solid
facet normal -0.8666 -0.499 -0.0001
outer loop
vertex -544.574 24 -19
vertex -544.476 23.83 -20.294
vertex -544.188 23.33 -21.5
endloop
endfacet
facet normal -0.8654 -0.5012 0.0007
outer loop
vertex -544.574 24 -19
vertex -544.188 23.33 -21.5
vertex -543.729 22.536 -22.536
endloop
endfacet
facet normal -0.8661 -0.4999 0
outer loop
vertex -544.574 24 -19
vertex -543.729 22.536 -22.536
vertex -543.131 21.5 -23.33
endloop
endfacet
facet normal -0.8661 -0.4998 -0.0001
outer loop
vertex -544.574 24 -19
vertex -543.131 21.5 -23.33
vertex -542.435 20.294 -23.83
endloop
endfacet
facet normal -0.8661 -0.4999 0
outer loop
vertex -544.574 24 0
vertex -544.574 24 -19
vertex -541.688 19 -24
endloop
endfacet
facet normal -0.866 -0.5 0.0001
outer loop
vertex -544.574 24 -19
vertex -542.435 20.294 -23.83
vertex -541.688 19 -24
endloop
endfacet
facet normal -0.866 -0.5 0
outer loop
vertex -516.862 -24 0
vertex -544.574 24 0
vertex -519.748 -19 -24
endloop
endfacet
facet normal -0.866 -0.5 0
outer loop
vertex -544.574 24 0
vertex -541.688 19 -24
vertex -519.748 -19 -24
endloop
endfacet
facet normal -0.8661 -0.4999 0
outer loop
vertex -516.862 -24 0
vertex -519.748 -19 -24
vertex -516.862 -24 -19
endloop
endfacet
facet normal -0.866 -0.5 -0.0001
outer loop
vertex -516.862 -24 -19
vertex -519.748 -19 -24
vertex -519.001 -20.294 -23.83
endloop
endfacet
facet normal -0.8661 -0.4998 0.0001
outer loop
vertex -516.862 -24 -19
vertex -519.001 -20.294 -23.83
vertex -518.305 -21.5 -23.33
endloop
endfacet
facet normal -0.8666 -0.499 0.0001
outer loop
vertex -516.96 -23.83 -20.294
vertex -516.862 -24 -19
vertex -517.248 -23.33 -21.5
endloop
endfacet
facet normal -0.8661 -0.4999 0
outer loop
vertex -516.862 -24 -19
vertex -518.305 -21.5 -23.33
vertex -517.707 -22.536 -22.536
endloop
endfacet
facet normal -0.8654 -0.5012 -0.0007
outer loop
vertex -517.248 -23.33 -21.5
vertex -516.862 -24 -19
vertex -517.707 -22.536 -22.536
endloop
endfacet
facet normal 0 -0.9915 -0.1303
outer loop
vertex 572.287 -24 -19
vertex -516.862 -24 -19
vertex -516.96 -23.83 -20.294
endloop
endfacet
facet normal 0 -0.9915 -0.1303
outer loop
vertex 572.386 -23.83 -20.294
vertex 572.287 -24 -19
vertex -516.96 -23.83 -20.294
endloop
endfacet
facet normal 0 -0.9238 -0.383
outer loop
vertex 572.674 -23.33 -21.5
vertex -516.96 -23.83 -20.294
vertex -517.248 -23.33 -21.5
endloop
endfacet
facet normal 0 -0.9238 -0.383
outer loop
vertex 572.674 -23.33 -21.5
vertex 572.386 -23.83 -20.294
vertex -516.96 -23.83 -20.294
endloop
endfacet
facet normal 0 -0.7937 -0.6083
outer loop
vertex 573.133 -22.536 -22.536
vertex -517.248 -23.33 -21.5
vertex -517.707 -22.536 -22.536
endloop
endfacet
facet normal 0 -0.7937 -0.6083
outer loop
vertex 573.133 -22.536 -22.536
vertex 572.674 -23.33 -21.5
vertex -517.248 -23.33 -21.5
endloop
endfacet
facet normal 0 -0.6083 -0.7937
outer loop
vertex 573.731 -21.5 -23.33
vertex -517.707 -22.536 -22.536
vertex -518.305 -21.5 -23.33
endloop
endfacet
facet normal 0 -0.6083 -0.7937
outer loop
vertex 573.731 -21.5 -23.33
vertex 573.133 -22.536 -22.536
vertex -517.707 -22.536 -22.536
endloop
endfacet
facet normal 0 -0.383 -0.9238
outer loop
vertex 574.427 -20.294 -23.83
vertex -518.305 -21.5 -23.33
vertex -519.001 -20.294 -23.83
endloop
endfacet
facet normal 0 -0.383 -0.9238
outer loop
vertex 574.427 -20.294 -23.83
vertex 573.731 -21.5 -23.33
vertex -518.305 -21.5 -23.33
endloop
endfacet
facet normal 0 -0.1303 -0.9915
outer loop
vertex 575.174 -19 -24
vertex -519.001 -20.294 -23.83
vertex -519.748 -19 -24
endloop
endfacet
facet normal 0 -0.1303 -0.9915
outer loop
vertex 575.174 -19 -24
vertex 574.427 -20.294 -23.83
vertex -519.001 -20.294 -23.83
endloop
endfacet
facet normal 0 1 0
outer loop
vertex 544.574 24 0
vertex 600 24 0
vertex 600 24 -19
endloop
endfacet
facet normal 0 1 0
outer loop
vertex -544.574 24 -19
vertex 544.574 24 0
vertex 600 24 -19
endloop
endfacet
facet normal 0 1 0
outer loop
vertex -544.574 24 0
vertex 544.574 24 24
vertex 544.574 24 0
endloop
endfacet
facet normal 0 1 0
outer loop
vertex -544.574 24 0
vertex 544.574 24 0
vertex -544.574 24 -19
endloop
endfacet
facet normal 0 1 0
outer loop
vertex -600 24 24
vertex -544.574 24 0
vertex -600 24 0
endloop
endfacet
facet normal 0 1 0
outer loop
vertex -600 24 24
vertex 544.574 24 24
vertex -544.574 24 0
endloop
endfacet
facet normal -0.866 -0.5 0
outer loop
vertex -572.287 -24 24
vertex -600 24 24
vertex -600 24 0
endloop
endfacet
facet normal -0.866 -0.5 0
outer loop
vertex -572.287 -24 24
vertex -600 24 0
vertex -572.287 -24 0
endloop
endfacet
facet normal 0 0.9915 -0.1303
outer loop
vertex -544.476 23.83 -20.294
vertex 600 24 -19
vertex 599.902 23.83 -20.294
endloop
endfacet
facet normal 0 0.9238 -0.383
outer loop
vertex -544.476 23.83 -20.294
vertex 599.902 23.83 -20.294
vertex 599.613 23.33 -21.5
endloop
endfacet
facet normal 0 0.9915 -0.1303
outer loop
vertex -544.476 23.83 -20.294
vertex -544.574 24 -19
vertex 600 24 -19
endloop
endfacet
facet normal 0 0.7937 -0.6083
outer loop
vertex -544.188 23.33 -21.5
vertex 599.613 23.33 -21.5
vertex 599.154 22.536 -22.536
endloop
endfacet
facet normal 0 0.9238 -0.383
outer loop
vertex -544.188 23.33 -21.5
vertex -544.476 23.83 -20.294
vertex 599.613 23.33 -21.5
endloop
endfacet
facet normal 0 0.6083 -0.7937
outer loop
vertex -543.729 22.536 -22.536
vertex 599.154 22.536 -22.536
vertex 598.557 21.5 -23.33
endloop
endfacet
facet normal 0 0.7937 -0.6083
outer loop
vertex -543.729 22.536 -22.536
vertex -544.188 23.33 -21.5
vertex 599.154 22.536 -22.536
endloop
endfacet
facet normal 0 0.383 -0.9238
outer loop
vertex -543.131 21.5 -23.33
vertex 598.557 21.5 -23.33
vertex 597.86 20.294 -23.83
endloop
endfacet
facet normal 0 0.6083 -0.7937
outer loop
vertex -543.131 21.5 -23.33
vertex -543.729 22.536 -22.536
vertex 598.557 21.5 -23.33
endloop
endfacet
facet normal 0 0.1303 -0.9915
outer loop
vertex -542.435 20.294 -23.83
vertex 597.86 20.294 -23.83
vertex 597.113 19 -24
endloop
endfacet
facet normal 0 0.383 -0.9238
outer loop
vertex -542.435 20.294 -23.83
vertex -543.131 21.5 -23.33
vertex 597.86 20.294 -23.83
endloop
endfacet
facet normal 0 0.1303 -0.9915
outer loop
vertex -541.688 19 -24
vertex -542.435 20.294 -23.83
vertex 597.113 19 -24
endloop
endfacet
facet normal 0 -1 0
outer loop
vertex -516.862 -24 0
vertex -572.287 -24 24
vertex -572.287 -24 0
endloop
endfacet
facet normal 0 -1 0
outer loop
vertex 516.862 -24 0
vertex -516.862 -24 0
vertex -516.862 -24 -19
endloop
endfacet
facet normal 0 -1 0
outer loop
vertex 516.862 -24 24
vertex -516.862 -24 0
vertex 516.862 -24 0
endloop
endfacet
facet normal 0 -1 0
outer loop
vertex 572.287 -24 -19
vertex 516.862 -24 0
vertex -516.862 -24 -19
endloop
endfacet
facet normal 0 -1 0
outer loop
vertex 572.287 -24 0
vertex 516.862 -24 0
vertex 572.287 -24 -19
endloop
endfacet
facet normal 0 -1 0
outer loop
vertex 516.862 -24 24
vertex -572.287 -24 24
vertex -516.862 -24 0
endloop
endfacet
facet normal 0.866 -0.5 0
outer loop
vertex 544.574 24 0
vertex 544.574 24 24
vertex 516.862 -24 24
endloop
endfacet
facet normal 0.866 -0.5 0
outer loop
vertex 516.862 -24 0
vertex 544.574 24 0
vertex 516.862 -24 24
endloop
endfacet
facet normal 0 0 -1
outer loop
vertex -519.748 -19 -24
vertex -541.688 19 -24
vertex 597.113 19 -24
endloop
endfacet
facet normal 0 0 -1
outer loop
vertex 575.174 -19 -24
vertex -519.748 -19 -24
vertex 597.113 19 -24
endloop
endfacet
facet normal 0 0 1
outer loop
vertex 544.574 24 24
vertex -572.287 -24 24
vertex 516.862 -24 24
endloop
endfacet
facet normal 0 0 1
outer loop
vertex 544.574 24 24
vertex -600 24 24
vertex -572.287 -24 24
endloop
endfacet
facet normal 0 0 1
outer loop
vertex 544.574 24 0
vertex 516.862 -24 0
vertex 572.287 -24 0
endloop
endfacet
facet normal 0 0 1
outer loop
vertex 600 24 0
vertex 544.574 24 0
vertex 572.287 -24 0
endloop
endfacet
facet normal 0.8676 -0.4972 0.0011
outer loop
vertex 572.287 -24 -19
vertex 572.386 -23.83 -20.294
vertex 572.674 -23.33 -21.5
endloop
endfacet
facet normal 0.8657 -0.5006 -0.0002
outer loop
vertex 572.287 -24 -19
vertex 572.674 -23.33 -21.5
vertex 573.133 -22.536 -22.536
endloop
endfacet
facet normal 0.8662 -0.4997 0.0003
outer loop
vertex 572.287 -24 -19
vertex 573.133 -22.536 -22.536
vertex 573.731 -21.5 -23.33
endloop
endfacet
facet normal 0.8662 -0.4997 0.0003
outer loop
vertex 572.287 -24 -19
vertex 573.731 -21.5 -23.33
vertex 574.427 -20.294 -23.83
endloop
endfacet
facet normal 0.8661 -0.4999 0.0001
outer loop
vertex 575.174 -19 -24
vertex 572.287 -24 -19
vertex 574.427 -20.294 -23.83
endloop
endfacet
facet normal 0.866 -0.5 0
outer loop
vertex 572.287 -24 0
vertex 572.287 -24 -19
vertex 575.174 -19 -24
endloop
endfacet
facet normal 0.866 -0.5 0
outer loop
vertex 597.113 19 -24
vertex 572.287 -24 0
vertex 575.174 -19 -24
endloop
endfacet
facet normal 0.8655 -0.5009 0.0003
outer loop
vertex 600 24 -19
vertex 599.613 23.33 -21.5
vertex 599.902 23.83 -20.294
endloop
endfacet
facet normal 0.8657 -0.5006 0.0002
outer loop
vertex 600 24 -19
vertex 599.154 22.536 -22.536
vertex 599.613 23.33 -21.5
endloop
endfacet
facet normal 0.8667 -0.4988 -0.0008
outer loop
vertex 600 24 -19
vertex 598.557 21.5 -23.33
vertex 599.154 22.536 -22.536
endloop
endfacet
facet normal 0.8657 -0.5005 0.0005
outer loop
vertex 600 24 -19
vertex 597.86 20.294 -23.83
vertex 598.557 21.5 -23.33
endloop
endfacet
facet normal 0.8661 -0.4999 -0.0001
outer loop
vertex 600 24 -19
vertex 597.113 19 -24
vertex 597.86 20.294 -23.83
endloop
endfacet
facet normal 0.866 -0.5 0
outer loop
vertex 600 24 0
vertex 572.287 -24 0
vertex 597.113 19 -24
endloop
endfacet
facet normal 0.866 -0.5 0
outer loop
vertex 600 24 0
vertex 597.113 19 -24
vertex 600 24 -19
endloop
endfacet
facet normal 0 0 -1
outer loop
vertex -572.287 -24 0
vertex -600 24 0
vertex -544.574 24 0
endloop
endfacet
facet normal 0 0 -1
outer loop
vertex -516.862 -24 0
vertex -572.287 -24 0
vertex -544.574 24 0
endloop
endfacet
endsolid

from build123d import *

# Parameters (mm, degrees)
F1_DEPTH = 24
F3_DEPTH = 24
F5_DEPTH = 24
F6_R     = 5


with BuildPart() as f1:
    # F0 (on Top) → F1 (new body, symmetric)
    with BuildSketch(Plane.XY):
        Polygon((572.287187, -24), (600, 24), (-600, 24), (-572.287187, -24), align=None)
    extrude(amount=F1_DEPTH, both=True)

    # F2 (on face) → F3 (cut)
    with BuildSketch(Plane.XY.offset(24)):
        Polygon((544.574374, 24), (516.861561, -24), (572.287187, -24), (600, 24), align=None)
    extrude(amount=-F3_DEPTH, mode=Mode.SUBTRACT)

    # F4 (on face) → F5 (cut)
    with BuildSketch(Plane(origin=(0, 0, -24), x_dir=(1, 0, 0), z_dir=(0, 0, -1))):
        Polygon((-544.574374, -24), (-516.861561, 24), (-572.287187, 24), (-600, -24), align=None)
    extrude(amount=-F5_DEPTH, mode=Mode.SUBTRACT)

    # F6
    f6_edges = [f1.edges().sort_by_distance(p)[0] for p in [
        (27.712813, 24, -24),
        (27.712813, -24, -24),
    ]]
    fillet(f6_edges, radius=F6_R)


solid = f1.part
